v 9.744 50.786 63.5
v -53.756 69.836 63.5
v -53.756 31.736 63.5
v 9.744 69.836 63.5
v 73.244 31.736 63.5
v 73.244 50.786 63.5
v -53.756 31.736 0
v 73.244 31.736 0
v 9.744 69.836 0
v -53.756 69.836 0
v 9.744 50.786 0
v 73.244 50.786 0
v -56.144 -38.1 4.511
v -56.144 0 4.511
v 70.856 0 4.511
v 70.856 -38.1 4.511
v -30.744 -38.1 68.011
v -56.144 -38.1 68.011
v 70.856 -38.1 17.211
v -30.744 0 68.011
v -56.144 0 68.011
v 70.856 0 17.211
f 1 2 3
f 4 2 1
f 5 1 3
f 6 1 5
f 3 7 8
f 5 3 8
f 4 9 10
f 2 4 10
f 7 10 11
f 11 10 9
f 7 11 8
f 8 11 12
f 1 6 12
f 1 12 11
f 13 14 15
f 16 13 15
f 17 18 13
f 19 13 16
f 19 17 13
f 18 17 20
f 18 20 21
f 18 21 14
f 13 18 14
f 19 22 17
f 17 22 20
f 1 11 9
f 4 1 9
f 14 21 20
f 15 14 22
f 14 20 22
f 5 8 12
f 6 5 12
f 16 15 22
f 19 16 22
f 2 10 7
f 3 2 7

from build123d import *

# Parameters (mm, degrees)
F1_DEPTH = 38.1
F3_DEPTH = 63.5


with BuildPart() as f1:
    # F0 (on Front) → F1 (new body)
    with BuildSketch(Plane.XZ):
        Polygon((-30.7444, 68.011058), (-56.1444, 68.011058), (-56.1444, 4.511058), (70.8556, 4.511058), (70.8556, 17.211058), align=None)
    extrude(amount=F1_DEPTH)


with BuildPart() as f3:
    # F2 (on Top) → F3 (new body)
    with BuildSketch(Plane.XY):
        Polygon((9.743607, 69.836176), (-53.756393, 69.836176), (-53.756393, 31.736176), (73.243607, 31.736176), (73.243607, 50.786176), (9.743607, 50.786176), align=None)
    extrude(amount=F3_DEPTH)


solid = Compound([f1.part, f3.part])
